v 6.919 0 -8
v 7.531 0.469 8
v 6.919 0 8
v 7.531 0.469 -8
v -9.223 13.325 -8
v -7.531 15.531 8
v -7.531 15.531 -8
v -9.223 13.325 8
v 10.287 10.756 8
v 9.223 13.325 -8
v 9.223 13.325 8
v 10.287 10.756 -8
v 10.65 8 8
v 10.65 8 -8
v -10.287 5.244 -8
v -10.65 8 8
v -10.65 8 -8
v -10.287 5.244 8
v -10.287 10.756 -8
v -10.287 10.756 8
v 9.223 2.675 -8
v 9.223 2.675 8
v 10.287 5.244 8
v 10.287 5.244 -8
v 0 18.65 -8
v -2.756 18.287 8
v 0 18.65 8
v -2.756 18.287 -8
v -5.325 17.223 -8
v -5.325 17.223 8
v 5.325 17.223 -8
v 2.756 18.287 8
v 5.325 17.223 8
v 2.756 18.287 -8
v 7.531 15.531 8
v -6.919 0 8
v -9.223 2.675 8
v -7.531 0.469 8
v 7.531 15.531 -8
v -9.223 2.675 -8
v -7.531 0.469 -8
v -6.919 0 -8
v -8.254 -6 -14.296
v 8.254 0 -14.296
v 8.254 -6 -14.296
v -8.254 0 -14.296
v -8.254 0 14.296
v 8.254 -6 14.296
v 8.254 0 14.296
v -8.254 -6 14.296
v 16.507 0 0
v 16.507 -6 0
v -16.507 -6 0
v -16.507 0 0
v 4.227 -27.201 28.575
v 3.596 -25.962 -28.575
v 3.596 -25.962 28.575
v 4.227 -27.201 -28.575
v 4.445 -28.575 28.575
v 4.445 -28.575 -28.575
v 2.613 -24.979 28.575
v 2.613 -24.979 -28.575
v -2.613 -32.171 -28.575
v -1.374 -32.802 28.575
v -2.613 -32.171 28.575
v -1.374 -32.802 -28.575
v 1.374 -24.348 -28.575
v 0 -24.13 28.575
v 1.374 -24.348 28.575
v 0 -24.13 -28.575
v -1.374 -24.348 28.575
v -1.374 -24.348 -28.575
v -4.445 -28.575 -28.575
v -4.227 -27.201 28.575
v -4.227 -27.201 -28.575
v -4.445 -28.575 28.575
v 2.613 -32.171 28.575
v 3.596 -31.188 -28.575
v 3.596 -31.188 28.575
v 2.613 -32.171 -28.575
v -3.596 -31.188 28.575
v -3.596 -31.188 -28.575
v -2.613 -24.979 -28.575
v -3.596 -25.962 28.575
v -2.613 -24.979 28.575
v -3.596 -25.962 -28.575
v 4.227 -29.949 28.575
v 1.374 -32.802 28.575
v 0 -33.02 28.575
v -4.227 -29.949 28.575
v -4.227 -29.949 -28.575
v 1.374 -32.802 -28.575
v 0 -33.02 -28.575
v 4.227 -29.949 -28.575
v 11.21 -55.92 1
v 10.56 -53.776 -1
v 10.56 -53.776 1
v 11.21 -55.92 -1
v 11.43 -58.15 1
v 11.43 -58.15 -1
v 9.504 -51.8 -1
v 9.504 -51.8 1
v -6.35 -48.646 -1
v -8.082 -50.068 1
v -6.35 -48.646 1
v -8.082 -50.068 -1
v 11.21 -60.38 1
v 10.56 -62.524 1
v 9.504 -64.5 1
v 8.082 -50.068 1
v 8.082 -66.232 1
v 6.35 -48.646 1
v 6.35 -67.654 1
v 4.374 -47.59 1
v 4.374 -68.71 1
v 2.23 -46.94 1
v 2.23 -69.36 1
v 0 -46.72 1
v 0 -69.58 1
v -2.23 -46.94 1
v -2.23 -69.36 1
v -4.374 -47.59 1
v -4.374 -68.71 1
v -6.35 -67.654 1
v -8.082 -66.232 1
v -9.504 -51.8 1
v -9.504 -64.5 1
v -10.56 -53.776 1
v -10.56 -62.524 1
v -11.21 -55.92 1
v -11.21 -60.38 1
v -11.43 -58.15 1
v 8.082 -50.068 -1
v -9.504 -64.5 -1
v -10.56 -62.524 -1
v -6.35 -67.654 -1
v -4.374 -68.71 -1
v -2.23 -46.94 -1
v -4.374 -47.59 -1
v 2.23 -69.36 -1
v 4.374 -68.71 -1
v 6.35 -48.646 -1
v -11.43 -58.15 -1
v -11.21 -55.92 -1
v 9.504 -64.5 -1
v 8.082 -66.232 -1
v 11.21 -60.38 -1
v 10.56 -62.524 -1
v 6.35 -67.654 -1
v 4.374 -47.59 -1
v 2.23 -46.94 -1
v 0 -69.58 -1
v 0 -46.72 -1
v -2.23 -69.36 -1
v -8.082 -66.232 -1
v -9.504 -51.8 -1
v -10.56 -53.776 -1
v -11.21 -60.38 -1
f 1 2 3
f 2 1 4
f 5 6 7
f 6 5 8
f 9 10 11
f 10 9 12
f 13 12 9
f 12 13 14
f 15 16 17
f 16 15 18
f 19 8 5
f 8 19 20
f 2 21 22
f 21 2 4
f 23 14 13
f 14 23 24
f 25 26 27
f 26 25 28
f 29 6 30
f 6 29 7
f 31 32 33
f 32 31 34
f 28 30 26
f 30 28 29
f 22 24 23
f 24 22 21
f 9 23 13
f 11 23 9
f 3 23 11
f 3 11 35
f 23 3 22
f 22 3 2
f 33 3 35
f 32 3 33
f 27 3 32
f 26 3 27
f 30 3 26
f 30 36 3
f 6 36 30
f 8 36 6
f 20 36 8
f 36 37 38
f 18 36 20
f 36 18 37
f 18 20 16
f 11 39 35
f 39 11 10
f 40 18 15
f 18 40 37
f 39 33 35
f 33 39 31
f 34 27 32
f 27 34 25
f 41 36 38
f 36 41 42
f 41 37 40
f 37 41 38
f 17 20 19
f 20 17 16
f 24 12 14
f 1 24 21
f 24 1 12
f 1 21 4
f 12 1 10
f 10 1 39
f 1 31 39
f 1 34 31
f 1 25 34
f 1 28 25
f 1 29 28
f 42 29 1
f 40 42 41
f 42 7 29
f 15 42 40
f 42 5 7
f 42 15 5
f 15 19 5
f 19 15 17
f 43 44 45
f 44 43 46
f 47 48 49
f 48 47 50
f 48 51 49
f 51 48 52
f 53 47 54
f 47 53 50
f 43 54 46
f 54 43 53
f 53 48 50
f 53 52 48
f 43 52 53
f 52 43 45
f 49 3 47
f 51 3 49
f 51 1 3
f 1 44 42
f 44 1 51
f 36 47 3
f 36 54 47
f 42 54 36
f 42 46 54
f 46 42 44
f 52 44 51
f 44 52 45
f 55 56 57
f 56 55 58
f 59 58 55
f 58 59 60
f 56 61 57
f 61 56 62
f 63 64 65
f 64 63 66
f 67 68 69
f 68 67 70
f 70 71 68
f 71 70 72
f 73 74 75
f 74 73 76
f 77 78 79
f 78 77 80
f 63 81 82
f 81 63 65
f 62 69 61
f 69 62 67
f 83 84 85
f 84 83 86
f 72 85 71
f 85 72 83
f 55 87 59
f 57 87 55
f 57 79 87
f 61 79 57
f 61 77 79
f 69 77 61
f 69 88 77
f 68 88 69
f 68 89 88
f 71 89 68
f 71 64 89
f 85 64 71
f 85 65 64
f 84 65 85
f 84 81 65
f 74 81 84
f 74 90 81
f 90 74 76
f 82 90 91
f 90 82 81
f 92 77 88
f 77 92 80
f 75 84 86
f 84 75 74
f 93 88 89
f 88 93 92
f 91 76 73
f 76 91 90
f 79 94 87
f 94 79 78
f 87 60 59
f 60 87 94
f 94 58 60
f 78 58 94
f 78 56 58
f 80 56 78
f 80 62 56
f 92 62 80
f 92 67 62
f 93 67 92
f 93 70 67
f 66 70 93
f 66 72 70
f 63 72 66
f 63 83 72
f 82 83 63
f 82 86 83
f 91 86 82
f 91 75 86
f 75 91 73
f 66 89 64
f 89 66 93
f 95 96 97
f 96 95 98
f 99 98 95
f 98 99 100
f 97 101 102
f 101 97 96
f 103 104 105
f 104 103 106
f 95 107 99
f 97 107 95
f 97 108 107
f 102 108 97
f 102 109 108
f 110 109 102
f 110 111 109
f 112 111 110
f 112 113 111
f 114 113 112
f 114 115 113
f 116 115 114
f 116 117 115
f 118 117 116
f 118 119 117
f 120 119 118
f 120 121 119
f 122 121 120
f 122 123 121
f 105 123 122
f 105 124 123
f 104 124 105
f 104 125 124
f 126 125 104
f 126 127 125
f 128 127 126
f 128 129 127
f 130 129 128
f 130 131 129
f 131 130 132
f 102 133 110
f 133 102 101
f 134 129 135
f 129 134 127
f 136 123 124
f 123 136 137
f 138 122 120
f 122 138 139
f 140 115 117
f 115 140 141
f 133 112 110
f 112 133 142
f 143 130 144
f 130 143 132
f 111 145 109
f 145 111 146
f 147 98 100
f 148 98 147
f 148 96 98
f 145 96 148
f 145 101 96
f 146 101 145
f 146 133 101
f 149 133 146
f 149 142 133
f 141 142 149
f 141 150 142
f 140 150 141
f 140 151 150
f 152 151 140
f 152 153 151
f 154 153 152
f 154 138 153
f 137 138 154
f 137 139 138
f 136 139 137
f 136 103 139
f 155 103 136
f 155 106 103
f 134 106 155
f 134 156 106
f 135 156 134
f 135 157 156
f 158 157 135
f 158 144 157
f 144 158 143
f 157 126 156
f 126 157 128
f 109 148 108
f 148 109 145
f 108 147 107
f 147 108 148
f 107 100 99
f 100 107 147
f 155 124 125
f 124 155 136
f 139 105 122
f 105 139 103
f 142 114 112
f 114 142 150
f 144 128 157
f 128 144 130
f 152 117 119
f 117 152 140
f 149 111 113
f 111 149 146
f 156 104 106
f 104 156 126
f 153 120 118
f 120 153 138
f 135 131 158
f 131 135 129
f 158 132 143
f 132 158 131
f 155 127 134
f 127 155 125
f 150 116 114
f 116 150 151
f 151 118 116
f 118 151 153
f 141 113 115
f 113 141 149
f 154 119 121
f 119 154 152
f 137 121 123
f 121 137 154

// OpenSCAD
// Auto-generated by scripts/author_from_manifest.py (Phase D.3).
// Source: data/phase_d_manifest.json (sku_intent='tyco-ty1234-qr-pendent-155f').
// Do not hand-edit — regenerate from the manifest.
//
// @part tyco_ty1234_qr_pendent_155f
// @kind sprinkler_head
// @category head.pendant.k56
// @display-name "Tyco TY1234 Quick-Response Pendent K5.6 155°F"
// @mfg tyco_fire_protection
// @mfg-pn TY1234
// @listing UL FM
// @hazard-classes LH OH1
// @price-usd 15.25
// @install-minutes 8
// @crew journeyman
// @k-factor 5.6
// @orientation pendant
// @response quick
// @temperature 155F
// @param size_in number default=0.5 label="Size" unit="in"
// @port inlet position=[0,0.014,0] direction=[0,1,0] style=NPT_threaded size_in=0.5 role=drop

size_in = 0.5;
k_factor = 5.6;

length_mm   = 57.15;
body_dia_mm = 25.40;
thread_od   = 21.3;
thread_len  = 16;
deflector_d = body_dia_mm * 0.9;

 union() {
    translate([0, thread_len/2, 0])
        cylinder(h = thread_len, d = thread_od, center = true, $fn = 24);
    translate([0, -3, 0])
        rotate([90, 0, 0])
        cylinder(h = 6, d = thread_od * 1.55, $fn = 6, center = true);
    translate([0, -length_mm/2, 0])
        cylinder(h = length_mm, d = body_dia_mm * 0.35, center = true, $fn = 20);
    translate([0, -length_mm - 1, 0])
        cylinder(h = 2, d = deflector_d, center = true, $fn = 32);
}
